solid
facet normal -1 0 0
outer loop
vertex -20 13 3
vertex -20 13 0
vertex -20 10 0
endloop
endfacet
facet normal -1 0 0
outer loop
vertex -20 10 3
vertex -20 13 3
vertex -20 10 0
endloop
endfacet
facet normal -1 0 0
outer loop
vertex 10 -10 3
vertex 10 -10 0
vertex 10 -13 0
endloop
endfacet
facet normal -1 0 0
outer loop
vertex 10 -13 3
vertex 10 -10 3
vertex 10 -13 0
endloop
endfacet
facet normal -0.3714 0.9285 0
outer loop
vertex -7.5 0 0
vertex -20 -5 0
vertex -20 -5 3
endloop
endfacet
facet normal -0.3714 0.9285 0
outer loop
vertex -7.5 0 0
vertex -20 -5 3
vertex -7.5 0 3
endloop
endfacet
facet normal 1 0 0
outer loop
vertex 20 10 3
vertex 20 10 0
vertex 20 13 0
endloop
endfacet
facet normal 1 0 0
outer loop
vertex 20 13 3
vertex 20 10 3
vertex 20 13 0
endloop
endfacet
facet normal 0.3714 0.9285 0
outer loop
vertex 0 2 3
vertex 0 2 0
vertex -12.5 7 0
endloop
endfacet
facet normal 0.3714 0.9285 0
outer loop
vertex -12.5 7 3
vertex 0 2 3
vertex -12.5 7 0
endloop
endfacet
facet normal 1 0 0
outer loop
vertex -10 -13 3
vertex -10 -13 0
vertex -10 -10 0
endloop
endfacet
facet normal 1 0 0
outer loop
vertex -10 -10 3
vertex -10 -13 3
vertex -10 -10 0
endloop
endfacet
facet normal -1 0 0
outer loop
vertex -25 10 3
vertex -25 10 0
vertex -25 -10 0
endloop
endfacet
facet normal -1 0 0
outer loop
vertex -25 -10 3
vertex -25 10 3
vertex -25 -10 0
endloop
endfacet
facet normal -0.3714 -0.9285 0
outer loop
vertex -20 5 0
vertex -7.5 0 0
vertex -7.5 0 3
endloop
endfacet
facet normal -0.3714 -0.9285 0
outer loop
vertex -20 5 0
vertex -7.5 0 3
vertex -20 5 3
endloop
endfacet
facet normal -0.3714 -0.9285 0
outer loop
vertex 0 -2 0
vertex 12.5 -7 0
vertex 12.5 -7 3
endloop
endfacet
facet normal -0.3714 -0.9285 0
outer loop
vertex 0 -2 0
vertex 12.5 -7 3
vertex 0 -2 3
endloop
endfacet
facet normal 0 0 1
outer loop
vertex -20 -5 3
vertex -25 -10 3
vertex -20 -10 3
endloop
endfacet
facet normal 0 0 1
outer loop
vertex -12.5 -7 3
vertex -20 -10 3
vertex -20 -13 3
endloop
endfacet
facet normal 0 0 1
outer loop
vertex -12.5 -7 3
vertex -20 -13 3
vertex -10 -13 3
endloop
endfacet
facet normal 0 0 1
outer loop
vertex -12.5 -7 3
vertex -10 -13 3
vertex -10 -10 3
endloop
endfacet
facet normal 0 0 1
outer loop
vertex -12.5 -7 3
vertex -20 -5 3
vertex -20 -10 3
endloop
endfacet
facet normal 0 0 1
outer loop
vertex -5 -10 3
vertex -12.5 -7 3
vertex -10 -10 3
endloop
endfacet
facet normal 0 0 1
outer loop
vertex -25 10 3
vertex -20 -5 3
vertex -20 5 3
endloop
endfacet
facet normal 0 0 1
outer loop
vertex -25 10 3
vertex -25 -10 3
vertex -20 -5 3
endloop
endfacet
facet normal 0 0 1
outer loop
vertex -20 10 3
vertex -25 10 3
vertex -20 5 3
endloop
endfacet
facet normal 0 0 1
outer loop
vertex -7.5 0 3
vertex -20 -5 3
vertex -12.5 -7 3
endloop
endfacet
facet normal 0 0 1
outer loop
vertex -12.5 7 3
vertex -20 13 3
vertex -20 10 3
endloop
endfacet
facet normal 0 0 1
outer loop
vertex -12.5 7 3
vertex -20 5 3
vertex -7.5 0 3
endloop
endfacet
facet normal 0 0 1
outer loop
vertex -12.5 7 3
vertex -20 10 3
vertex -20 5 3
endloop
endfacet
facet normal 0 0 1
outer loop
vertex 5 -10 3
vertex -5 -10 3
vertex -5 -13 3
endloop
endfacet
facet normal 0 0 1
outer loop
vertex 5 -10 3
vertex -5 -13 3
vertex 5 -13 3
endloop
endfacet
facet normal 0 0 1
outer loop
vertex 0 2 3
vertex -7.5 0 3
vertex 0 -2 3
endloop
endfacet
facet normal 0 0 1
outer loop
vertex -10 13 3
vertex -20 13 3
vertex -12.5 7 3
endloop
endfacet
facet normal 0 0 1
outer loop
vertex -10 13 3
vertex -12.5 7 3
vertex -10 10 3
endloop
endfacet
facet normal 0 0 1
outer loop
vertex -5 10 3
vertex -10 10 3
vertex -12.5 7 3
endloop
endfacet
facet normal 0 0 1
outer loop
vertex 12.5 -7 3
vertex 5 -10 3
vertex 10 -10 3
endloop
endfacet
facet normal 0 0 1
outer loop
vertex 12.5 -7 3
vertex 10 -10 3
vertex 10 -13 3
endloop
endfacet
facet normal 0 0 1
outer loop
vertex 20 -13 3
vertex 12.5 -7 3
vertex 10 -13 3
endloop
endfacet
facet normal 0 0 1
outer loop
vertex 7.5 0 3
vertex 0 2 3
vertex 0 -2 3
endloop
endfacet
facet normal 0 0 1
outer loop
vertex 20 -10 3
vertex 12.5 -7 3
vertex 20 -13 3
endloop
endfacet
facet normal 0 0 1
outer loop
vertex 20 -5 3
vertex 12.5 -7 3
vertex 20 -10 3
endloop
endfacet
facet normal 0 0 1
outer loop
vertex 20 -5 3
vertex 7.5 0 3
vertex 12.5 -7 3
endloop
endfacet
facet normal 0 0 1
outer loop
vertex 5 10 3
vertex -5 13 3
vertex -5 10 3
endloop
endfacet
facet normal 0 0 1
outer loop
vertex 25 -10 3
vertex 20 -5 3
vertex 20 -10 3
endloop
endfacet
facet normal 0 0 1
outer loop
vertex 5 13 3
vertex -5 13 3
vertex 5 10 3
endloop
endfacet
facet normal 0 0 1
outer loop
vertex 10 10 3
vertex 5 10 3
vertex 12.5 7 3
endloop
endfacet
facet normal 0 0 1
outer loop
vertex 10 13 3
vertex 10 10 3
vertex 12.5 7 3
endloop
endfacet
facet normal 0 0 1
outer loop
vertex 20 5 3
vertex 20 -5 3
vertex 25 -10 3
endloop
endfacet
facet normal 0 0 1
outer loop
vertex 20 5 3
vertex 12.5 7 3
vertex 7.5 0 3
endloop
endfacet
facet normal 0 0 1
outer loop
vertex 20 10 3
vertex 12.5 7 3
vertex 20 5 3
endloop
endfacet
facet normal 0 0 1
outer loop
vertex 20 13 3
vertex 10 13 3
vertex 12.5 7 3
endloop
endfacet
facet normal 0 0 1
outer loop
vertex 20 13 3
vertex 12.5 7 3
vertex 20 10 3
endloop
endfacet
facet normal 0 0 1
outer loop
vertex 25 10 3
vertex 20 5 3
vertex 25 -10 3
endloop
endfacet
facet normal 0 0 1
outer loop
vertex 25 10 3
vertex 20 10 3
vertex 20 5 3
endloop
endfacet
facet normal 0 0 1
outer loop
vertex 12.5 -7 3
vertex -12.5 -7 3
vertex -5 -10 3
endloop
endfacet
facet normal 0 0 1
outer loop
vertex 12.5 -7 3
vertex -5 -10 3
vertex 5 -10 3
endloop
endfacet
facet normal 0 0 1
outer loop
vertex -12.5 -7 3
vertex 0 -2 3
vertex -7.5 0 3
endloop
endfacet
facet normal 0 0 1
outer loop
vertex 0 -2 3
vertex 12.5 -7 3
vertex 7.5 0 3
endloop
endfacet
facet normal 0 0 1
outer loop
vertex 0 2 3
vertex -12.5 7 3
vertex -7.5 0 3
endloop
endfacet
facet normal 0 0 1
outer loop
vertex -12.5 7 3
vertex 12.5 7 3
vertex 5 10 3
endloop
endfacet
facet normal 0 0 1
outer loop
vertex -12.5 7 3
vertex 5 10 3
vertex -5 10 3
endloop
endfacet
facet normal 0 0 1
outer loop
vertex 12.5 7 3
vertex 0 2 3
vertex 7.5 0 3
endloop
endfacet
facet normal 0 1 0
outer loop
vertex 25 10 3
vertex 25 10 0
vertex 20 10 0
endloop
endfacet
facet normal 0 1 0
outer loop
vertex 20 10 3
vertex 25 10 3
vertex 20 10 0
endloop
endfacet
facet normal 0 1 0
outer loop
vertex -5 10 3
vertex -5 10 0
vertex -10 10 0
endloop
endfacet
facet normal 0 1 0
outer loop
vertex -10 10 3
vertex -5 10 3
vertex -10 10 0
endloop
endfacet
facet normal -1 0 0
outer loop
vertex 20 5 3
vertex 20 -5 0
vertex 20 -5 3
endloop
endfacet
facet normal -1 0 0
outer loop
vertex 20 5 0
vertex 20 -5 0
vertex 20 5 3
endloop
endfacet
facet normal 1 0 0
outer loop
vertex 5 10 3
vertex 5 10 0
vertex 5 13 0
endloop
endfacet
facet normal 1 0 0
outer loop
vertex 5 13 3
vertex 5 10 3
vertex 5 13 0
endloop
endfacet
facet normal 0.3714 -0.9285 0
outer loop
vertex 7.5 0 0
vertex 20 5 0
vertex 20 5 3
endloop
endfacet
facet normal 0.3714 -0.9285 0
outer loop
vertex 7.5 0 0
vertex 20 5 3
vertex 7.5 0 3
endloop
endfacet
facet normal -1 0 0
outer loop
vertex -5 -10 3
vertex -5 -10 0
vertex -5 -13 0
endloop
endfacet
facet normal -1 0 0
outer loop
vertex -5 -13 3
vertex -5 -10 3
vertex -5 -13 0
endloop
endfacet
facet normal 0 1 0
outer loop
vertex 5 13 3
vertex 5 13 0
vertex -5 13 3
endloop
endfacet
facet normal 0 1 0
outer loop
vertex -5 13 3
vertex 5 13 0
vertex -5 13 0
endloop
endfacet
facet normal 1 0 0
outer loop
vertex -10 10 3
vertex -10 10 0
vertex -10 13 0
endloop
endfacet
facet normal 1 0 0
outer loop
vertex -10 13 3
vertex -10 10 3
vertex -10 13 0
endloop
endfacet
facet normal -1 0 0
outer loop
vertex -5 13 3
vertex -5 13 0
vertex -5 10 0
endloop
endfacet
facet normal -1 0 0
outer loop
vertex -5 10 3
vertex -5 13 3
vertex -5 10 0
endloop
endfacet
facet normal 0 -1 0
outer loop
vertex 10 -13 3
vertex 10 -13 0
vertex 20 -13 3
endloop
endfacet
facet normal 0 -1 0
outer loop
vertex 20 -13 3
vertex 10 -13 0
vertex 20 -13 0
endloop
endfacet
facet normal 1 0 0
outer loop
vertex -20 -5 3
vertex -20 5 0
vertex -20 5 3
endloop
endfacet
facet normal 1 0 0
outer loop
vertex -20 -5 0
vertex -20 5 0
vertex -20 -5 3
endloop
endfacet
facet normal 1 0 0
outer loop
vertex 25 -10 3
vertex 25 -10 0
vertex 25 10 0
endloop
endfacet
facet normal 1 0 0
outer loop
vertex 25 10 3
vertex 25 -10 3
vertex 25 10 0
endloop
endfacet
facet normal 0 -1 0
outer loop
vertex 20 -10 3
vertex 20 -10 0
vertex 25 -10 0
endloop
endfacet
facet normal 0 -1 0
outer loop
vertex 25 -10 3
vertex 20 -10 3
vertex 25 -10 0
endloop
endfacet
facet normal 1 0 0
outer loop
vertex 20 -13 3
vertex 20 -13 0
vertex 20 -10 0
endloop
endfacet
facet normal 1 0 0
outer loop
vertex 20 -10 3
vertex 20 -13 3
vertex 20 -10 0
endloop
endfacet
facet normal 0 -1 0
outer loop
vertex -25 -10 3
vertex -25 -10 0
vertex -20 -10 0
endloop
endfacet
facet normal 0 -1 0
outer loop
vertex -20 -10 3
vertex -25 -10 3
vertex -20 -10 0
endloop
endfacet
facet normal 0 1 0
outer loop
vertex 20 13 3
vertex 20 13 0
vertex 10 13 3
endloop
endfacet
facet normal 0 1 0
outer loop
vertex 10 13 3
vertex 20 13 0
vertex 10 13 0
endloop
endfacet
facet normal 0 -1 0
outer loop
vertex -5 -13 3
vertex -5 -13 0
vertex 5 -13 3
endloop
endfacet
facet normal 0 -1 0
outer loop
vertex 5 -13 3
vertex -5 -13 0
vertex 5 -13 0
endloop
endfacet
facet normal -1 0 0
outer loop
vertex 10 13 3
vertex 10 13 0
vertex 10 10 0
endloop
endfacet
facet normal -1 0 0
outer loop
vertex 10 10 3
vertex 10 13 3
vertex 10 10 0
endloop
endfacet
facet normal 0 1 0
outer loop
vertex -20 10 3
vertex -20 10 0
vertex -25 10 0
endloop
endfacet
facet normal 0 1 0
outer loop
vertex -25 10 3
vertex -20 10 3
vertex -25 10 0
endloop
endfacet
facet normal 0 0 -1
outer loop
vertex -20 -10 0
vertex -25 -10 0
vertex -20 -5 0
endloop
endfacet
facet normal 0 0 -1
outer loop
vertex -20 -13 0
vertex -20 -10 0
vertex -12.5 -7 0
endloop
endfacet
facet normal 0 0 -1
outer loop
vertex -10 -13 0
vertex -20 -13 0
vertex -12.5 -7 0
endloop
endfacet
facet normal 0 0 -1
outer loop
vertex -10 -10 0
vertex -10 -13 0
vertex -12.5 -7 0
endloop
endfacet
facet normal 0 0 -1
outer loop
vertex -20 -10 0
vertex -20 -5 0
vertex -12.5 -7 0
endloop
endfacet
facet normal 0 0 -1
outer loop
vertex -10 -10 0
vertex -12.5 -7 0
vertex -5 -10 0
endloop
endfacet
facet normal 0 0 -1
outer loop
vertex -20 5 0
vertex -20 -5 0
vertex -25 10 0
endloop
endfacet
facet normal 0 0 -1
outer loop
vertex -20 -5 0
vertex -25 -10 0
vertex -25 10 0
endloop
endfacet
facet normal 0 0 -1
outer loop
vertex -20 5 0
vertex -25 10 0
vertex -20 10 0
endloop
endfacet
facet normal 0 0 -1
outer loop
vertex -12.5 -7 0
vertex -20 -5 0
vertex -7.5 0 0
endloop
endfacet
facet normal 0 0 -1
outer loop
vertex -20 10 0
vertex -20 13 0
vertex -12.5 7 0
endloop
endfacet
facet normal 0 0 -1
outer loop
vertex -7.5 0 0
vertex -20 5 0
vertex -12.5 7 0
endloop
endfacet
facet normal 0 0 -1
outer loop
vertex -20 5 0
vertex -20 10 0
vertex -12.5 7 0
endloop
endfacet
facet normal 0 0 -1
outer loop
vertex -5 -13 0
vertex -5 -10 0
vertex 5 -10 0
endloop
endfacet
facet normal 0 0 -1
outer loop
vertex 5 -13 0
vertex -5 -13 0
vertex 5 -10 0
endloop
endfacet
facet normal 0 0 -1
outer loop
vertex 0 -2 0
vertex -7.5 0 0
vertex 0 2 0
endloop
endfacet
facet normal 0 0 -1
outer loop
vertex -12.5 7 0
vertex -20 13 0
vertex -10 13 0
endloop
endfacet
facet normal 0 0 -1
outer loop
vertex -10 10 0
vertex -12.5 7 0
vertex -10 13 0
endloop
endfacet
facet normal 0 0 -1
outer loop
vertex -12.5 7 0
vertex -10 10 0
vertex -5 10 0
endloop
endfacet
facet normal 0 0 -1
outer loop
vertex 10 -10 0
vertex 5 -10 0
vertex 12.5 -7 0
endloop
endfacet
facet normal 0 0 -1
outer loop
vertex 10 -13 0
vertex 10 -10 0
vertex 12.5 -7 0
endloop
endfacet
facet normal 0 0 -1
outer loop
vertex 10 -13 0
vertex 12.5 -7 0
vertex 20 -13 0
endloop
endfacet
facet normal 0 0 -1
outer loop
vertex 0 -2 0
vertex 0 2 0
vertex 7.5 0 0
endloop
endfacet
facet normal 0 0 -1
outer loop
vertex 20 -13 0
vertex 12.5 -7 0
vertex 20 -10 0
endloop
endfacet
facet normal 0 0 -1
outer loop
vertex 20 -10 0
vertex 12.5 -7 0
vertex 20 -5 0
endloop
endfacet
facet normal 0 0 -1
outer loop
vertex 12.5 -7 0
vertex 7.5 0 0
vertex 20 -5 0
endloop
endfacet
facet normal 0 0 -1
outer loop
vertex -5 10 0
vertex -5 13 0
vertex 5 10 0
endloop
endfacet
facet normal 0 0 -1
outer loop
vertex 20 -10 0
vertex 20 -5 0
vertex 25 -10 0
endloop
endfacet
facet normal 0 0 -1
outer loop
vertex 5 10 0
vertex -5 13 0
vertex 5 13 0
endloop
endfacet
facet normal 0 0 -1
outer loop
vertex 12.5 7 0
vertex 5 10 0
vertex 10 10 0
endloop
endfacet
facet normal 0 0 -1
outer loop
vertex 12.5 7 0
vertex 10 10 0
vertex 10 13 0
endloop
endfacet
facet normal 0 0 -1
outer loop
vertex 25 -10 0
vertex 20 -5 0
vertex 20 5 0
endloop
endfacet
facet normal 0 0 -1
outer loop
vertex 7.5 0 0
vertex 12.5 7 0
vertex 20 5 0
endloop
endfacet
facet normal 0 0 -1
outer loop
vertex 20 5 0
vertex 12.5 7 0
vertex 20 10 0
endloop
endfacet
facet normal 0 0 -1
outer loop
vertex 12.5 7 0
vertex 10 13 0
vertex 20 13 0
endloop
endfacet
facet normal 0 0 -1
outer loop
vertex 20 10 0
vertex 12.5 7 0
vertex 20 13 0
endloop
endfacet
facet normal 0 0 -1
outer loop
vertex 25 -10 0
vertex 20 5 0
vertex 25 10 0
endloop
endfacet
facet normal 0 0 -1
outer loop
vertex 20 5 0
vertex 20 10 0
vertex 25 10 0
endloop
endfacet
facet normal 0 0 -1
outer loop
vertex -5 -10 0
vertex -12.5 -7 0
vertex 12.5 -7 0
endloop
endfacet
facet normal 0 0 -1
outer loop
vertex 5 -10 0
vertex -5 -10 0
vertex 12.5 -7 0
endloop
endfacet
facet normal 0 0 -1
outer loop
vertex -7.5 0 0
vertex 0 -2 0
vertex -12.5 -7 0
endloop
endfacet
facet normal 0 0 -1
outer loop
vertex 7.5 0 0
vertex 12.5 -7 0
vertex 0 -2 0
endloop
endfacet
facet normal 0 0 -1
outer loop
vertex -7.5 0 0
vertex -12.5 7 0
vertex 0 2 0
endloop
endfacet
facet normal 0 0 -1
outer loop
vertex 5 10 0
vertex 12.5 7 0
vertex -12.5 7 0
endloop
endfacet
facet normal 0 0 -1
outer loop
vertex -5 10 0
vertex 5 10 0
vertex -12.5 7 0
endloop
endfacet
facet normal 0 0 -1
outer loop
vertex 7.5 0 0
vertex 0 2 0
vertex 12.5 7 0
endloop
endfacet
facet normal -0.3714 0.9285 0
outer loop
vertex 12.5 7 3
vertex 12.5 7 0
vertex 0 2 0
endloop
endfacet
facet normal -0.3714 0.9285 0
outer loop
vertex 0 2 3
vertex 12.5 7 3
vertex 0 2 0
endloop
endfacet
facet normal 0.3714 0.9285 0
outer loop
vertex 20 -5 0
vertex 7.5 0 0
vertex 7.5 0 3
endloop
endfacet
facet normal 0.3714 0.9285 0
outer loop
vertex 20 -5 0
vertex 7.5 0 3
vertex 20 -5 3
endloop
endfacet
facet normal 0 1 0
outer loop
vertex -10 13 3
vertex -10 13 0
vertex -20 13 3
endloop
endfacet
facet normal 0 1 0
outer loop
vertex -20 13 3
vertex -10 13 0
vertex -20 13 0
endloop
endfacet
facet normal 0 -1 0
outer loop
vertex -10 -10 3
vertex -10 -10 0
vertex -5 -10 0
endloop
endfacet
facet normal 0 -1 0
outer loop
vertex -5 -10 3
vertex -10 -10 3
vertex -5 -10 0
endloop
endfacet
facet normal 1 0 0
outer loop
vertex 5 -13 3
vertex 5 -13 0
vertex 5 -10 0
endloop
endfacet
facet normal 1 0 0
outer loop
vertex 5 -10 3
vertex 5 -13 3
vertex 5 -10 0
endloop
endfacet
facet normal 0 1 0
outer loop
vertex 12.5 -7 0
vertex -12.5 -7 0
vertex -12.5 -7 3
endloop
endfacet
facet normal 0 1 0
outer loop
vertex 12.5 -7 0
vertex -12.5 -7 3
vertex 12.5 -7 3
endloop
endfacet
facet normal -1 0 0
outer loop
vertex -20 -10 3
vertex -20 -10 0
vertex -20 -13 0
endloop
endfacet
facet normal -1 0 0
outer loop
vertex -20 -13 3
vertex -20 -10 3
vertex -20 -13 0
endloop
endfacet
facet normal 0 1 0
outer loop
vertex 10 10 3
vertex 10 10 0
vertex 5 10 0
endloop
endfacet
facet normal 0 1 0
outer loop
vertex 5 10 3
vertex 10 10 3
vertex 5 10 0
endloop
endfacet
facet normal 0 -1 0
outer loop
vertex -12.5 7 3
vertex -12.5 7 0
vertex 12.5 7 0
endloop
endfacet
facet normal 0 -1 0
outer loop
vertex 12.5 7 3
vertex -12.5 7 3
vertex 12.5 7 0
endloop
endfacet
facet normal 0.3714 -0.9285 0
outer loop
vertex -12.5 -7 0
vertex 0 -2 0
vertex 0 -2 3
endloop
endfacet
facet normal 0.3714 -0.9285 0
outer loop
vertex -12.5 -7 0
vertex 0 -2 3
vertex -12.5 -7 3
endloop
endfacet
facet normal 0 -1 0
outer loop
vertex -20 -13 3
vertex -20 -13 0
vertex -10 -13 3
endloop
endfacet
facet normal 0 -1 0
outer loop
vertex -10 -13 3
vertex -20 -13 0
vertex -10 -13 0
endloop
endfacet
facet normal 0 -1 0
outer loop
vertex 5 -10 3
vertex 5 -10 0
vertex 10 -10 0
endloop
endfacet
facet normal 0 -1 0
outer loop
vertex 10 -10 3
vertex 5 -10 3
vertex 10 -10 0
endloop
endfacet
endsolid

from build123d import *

# Parameters (mm, degrees)
EXTRUDE_1_DEPTH = 3


with BuildPart() as part:
    # 草图1 → 凸台-拉伸1 (new body)
    with BuildSketch(Plane.XY):
        Polygon((-25, -10), (-20, -10), (-20, -13), (-10, -13), (-10, -10), (-5, -10), (-5, -13), (5, -13), (5, -10), (10, -10), (10, -13), (20, -13), (20, -10), (25, -10), (25, -8), (25, -2), (25, 2), (25, 8), (25, 10), (20, 10), (20, 13), (10, 13), (10, 10), (5, 10), (5, 13), (-5, 13), (-5, 10), (-10, 10), (-10, 13), (-20, 13), (-20, 10), (-25, 10), (-25, 8), (-25, 2), (-25, -2), (-25, -8), align=None)
        Polygon((-12.5, 7), (12.5, 7), (0, 2), align=None, mode=Mode.SUBTRACT)
        Polygon((20, -5), (20, 5), (7.5, 0), align=None, mode=Mode.SUBTRACT)
        Polygon((-12.5, -7), (12.5, -7), (0, -2), align=None, mode=Mode.SUBTRACT)
        Polygon((-20, -5), (-7.5, 0), (-20, 5), align=None, mode=Mode.SUBTRACT)
    extrude(amount=EXTRUDE_1_DEPTH)


solid = part.part
